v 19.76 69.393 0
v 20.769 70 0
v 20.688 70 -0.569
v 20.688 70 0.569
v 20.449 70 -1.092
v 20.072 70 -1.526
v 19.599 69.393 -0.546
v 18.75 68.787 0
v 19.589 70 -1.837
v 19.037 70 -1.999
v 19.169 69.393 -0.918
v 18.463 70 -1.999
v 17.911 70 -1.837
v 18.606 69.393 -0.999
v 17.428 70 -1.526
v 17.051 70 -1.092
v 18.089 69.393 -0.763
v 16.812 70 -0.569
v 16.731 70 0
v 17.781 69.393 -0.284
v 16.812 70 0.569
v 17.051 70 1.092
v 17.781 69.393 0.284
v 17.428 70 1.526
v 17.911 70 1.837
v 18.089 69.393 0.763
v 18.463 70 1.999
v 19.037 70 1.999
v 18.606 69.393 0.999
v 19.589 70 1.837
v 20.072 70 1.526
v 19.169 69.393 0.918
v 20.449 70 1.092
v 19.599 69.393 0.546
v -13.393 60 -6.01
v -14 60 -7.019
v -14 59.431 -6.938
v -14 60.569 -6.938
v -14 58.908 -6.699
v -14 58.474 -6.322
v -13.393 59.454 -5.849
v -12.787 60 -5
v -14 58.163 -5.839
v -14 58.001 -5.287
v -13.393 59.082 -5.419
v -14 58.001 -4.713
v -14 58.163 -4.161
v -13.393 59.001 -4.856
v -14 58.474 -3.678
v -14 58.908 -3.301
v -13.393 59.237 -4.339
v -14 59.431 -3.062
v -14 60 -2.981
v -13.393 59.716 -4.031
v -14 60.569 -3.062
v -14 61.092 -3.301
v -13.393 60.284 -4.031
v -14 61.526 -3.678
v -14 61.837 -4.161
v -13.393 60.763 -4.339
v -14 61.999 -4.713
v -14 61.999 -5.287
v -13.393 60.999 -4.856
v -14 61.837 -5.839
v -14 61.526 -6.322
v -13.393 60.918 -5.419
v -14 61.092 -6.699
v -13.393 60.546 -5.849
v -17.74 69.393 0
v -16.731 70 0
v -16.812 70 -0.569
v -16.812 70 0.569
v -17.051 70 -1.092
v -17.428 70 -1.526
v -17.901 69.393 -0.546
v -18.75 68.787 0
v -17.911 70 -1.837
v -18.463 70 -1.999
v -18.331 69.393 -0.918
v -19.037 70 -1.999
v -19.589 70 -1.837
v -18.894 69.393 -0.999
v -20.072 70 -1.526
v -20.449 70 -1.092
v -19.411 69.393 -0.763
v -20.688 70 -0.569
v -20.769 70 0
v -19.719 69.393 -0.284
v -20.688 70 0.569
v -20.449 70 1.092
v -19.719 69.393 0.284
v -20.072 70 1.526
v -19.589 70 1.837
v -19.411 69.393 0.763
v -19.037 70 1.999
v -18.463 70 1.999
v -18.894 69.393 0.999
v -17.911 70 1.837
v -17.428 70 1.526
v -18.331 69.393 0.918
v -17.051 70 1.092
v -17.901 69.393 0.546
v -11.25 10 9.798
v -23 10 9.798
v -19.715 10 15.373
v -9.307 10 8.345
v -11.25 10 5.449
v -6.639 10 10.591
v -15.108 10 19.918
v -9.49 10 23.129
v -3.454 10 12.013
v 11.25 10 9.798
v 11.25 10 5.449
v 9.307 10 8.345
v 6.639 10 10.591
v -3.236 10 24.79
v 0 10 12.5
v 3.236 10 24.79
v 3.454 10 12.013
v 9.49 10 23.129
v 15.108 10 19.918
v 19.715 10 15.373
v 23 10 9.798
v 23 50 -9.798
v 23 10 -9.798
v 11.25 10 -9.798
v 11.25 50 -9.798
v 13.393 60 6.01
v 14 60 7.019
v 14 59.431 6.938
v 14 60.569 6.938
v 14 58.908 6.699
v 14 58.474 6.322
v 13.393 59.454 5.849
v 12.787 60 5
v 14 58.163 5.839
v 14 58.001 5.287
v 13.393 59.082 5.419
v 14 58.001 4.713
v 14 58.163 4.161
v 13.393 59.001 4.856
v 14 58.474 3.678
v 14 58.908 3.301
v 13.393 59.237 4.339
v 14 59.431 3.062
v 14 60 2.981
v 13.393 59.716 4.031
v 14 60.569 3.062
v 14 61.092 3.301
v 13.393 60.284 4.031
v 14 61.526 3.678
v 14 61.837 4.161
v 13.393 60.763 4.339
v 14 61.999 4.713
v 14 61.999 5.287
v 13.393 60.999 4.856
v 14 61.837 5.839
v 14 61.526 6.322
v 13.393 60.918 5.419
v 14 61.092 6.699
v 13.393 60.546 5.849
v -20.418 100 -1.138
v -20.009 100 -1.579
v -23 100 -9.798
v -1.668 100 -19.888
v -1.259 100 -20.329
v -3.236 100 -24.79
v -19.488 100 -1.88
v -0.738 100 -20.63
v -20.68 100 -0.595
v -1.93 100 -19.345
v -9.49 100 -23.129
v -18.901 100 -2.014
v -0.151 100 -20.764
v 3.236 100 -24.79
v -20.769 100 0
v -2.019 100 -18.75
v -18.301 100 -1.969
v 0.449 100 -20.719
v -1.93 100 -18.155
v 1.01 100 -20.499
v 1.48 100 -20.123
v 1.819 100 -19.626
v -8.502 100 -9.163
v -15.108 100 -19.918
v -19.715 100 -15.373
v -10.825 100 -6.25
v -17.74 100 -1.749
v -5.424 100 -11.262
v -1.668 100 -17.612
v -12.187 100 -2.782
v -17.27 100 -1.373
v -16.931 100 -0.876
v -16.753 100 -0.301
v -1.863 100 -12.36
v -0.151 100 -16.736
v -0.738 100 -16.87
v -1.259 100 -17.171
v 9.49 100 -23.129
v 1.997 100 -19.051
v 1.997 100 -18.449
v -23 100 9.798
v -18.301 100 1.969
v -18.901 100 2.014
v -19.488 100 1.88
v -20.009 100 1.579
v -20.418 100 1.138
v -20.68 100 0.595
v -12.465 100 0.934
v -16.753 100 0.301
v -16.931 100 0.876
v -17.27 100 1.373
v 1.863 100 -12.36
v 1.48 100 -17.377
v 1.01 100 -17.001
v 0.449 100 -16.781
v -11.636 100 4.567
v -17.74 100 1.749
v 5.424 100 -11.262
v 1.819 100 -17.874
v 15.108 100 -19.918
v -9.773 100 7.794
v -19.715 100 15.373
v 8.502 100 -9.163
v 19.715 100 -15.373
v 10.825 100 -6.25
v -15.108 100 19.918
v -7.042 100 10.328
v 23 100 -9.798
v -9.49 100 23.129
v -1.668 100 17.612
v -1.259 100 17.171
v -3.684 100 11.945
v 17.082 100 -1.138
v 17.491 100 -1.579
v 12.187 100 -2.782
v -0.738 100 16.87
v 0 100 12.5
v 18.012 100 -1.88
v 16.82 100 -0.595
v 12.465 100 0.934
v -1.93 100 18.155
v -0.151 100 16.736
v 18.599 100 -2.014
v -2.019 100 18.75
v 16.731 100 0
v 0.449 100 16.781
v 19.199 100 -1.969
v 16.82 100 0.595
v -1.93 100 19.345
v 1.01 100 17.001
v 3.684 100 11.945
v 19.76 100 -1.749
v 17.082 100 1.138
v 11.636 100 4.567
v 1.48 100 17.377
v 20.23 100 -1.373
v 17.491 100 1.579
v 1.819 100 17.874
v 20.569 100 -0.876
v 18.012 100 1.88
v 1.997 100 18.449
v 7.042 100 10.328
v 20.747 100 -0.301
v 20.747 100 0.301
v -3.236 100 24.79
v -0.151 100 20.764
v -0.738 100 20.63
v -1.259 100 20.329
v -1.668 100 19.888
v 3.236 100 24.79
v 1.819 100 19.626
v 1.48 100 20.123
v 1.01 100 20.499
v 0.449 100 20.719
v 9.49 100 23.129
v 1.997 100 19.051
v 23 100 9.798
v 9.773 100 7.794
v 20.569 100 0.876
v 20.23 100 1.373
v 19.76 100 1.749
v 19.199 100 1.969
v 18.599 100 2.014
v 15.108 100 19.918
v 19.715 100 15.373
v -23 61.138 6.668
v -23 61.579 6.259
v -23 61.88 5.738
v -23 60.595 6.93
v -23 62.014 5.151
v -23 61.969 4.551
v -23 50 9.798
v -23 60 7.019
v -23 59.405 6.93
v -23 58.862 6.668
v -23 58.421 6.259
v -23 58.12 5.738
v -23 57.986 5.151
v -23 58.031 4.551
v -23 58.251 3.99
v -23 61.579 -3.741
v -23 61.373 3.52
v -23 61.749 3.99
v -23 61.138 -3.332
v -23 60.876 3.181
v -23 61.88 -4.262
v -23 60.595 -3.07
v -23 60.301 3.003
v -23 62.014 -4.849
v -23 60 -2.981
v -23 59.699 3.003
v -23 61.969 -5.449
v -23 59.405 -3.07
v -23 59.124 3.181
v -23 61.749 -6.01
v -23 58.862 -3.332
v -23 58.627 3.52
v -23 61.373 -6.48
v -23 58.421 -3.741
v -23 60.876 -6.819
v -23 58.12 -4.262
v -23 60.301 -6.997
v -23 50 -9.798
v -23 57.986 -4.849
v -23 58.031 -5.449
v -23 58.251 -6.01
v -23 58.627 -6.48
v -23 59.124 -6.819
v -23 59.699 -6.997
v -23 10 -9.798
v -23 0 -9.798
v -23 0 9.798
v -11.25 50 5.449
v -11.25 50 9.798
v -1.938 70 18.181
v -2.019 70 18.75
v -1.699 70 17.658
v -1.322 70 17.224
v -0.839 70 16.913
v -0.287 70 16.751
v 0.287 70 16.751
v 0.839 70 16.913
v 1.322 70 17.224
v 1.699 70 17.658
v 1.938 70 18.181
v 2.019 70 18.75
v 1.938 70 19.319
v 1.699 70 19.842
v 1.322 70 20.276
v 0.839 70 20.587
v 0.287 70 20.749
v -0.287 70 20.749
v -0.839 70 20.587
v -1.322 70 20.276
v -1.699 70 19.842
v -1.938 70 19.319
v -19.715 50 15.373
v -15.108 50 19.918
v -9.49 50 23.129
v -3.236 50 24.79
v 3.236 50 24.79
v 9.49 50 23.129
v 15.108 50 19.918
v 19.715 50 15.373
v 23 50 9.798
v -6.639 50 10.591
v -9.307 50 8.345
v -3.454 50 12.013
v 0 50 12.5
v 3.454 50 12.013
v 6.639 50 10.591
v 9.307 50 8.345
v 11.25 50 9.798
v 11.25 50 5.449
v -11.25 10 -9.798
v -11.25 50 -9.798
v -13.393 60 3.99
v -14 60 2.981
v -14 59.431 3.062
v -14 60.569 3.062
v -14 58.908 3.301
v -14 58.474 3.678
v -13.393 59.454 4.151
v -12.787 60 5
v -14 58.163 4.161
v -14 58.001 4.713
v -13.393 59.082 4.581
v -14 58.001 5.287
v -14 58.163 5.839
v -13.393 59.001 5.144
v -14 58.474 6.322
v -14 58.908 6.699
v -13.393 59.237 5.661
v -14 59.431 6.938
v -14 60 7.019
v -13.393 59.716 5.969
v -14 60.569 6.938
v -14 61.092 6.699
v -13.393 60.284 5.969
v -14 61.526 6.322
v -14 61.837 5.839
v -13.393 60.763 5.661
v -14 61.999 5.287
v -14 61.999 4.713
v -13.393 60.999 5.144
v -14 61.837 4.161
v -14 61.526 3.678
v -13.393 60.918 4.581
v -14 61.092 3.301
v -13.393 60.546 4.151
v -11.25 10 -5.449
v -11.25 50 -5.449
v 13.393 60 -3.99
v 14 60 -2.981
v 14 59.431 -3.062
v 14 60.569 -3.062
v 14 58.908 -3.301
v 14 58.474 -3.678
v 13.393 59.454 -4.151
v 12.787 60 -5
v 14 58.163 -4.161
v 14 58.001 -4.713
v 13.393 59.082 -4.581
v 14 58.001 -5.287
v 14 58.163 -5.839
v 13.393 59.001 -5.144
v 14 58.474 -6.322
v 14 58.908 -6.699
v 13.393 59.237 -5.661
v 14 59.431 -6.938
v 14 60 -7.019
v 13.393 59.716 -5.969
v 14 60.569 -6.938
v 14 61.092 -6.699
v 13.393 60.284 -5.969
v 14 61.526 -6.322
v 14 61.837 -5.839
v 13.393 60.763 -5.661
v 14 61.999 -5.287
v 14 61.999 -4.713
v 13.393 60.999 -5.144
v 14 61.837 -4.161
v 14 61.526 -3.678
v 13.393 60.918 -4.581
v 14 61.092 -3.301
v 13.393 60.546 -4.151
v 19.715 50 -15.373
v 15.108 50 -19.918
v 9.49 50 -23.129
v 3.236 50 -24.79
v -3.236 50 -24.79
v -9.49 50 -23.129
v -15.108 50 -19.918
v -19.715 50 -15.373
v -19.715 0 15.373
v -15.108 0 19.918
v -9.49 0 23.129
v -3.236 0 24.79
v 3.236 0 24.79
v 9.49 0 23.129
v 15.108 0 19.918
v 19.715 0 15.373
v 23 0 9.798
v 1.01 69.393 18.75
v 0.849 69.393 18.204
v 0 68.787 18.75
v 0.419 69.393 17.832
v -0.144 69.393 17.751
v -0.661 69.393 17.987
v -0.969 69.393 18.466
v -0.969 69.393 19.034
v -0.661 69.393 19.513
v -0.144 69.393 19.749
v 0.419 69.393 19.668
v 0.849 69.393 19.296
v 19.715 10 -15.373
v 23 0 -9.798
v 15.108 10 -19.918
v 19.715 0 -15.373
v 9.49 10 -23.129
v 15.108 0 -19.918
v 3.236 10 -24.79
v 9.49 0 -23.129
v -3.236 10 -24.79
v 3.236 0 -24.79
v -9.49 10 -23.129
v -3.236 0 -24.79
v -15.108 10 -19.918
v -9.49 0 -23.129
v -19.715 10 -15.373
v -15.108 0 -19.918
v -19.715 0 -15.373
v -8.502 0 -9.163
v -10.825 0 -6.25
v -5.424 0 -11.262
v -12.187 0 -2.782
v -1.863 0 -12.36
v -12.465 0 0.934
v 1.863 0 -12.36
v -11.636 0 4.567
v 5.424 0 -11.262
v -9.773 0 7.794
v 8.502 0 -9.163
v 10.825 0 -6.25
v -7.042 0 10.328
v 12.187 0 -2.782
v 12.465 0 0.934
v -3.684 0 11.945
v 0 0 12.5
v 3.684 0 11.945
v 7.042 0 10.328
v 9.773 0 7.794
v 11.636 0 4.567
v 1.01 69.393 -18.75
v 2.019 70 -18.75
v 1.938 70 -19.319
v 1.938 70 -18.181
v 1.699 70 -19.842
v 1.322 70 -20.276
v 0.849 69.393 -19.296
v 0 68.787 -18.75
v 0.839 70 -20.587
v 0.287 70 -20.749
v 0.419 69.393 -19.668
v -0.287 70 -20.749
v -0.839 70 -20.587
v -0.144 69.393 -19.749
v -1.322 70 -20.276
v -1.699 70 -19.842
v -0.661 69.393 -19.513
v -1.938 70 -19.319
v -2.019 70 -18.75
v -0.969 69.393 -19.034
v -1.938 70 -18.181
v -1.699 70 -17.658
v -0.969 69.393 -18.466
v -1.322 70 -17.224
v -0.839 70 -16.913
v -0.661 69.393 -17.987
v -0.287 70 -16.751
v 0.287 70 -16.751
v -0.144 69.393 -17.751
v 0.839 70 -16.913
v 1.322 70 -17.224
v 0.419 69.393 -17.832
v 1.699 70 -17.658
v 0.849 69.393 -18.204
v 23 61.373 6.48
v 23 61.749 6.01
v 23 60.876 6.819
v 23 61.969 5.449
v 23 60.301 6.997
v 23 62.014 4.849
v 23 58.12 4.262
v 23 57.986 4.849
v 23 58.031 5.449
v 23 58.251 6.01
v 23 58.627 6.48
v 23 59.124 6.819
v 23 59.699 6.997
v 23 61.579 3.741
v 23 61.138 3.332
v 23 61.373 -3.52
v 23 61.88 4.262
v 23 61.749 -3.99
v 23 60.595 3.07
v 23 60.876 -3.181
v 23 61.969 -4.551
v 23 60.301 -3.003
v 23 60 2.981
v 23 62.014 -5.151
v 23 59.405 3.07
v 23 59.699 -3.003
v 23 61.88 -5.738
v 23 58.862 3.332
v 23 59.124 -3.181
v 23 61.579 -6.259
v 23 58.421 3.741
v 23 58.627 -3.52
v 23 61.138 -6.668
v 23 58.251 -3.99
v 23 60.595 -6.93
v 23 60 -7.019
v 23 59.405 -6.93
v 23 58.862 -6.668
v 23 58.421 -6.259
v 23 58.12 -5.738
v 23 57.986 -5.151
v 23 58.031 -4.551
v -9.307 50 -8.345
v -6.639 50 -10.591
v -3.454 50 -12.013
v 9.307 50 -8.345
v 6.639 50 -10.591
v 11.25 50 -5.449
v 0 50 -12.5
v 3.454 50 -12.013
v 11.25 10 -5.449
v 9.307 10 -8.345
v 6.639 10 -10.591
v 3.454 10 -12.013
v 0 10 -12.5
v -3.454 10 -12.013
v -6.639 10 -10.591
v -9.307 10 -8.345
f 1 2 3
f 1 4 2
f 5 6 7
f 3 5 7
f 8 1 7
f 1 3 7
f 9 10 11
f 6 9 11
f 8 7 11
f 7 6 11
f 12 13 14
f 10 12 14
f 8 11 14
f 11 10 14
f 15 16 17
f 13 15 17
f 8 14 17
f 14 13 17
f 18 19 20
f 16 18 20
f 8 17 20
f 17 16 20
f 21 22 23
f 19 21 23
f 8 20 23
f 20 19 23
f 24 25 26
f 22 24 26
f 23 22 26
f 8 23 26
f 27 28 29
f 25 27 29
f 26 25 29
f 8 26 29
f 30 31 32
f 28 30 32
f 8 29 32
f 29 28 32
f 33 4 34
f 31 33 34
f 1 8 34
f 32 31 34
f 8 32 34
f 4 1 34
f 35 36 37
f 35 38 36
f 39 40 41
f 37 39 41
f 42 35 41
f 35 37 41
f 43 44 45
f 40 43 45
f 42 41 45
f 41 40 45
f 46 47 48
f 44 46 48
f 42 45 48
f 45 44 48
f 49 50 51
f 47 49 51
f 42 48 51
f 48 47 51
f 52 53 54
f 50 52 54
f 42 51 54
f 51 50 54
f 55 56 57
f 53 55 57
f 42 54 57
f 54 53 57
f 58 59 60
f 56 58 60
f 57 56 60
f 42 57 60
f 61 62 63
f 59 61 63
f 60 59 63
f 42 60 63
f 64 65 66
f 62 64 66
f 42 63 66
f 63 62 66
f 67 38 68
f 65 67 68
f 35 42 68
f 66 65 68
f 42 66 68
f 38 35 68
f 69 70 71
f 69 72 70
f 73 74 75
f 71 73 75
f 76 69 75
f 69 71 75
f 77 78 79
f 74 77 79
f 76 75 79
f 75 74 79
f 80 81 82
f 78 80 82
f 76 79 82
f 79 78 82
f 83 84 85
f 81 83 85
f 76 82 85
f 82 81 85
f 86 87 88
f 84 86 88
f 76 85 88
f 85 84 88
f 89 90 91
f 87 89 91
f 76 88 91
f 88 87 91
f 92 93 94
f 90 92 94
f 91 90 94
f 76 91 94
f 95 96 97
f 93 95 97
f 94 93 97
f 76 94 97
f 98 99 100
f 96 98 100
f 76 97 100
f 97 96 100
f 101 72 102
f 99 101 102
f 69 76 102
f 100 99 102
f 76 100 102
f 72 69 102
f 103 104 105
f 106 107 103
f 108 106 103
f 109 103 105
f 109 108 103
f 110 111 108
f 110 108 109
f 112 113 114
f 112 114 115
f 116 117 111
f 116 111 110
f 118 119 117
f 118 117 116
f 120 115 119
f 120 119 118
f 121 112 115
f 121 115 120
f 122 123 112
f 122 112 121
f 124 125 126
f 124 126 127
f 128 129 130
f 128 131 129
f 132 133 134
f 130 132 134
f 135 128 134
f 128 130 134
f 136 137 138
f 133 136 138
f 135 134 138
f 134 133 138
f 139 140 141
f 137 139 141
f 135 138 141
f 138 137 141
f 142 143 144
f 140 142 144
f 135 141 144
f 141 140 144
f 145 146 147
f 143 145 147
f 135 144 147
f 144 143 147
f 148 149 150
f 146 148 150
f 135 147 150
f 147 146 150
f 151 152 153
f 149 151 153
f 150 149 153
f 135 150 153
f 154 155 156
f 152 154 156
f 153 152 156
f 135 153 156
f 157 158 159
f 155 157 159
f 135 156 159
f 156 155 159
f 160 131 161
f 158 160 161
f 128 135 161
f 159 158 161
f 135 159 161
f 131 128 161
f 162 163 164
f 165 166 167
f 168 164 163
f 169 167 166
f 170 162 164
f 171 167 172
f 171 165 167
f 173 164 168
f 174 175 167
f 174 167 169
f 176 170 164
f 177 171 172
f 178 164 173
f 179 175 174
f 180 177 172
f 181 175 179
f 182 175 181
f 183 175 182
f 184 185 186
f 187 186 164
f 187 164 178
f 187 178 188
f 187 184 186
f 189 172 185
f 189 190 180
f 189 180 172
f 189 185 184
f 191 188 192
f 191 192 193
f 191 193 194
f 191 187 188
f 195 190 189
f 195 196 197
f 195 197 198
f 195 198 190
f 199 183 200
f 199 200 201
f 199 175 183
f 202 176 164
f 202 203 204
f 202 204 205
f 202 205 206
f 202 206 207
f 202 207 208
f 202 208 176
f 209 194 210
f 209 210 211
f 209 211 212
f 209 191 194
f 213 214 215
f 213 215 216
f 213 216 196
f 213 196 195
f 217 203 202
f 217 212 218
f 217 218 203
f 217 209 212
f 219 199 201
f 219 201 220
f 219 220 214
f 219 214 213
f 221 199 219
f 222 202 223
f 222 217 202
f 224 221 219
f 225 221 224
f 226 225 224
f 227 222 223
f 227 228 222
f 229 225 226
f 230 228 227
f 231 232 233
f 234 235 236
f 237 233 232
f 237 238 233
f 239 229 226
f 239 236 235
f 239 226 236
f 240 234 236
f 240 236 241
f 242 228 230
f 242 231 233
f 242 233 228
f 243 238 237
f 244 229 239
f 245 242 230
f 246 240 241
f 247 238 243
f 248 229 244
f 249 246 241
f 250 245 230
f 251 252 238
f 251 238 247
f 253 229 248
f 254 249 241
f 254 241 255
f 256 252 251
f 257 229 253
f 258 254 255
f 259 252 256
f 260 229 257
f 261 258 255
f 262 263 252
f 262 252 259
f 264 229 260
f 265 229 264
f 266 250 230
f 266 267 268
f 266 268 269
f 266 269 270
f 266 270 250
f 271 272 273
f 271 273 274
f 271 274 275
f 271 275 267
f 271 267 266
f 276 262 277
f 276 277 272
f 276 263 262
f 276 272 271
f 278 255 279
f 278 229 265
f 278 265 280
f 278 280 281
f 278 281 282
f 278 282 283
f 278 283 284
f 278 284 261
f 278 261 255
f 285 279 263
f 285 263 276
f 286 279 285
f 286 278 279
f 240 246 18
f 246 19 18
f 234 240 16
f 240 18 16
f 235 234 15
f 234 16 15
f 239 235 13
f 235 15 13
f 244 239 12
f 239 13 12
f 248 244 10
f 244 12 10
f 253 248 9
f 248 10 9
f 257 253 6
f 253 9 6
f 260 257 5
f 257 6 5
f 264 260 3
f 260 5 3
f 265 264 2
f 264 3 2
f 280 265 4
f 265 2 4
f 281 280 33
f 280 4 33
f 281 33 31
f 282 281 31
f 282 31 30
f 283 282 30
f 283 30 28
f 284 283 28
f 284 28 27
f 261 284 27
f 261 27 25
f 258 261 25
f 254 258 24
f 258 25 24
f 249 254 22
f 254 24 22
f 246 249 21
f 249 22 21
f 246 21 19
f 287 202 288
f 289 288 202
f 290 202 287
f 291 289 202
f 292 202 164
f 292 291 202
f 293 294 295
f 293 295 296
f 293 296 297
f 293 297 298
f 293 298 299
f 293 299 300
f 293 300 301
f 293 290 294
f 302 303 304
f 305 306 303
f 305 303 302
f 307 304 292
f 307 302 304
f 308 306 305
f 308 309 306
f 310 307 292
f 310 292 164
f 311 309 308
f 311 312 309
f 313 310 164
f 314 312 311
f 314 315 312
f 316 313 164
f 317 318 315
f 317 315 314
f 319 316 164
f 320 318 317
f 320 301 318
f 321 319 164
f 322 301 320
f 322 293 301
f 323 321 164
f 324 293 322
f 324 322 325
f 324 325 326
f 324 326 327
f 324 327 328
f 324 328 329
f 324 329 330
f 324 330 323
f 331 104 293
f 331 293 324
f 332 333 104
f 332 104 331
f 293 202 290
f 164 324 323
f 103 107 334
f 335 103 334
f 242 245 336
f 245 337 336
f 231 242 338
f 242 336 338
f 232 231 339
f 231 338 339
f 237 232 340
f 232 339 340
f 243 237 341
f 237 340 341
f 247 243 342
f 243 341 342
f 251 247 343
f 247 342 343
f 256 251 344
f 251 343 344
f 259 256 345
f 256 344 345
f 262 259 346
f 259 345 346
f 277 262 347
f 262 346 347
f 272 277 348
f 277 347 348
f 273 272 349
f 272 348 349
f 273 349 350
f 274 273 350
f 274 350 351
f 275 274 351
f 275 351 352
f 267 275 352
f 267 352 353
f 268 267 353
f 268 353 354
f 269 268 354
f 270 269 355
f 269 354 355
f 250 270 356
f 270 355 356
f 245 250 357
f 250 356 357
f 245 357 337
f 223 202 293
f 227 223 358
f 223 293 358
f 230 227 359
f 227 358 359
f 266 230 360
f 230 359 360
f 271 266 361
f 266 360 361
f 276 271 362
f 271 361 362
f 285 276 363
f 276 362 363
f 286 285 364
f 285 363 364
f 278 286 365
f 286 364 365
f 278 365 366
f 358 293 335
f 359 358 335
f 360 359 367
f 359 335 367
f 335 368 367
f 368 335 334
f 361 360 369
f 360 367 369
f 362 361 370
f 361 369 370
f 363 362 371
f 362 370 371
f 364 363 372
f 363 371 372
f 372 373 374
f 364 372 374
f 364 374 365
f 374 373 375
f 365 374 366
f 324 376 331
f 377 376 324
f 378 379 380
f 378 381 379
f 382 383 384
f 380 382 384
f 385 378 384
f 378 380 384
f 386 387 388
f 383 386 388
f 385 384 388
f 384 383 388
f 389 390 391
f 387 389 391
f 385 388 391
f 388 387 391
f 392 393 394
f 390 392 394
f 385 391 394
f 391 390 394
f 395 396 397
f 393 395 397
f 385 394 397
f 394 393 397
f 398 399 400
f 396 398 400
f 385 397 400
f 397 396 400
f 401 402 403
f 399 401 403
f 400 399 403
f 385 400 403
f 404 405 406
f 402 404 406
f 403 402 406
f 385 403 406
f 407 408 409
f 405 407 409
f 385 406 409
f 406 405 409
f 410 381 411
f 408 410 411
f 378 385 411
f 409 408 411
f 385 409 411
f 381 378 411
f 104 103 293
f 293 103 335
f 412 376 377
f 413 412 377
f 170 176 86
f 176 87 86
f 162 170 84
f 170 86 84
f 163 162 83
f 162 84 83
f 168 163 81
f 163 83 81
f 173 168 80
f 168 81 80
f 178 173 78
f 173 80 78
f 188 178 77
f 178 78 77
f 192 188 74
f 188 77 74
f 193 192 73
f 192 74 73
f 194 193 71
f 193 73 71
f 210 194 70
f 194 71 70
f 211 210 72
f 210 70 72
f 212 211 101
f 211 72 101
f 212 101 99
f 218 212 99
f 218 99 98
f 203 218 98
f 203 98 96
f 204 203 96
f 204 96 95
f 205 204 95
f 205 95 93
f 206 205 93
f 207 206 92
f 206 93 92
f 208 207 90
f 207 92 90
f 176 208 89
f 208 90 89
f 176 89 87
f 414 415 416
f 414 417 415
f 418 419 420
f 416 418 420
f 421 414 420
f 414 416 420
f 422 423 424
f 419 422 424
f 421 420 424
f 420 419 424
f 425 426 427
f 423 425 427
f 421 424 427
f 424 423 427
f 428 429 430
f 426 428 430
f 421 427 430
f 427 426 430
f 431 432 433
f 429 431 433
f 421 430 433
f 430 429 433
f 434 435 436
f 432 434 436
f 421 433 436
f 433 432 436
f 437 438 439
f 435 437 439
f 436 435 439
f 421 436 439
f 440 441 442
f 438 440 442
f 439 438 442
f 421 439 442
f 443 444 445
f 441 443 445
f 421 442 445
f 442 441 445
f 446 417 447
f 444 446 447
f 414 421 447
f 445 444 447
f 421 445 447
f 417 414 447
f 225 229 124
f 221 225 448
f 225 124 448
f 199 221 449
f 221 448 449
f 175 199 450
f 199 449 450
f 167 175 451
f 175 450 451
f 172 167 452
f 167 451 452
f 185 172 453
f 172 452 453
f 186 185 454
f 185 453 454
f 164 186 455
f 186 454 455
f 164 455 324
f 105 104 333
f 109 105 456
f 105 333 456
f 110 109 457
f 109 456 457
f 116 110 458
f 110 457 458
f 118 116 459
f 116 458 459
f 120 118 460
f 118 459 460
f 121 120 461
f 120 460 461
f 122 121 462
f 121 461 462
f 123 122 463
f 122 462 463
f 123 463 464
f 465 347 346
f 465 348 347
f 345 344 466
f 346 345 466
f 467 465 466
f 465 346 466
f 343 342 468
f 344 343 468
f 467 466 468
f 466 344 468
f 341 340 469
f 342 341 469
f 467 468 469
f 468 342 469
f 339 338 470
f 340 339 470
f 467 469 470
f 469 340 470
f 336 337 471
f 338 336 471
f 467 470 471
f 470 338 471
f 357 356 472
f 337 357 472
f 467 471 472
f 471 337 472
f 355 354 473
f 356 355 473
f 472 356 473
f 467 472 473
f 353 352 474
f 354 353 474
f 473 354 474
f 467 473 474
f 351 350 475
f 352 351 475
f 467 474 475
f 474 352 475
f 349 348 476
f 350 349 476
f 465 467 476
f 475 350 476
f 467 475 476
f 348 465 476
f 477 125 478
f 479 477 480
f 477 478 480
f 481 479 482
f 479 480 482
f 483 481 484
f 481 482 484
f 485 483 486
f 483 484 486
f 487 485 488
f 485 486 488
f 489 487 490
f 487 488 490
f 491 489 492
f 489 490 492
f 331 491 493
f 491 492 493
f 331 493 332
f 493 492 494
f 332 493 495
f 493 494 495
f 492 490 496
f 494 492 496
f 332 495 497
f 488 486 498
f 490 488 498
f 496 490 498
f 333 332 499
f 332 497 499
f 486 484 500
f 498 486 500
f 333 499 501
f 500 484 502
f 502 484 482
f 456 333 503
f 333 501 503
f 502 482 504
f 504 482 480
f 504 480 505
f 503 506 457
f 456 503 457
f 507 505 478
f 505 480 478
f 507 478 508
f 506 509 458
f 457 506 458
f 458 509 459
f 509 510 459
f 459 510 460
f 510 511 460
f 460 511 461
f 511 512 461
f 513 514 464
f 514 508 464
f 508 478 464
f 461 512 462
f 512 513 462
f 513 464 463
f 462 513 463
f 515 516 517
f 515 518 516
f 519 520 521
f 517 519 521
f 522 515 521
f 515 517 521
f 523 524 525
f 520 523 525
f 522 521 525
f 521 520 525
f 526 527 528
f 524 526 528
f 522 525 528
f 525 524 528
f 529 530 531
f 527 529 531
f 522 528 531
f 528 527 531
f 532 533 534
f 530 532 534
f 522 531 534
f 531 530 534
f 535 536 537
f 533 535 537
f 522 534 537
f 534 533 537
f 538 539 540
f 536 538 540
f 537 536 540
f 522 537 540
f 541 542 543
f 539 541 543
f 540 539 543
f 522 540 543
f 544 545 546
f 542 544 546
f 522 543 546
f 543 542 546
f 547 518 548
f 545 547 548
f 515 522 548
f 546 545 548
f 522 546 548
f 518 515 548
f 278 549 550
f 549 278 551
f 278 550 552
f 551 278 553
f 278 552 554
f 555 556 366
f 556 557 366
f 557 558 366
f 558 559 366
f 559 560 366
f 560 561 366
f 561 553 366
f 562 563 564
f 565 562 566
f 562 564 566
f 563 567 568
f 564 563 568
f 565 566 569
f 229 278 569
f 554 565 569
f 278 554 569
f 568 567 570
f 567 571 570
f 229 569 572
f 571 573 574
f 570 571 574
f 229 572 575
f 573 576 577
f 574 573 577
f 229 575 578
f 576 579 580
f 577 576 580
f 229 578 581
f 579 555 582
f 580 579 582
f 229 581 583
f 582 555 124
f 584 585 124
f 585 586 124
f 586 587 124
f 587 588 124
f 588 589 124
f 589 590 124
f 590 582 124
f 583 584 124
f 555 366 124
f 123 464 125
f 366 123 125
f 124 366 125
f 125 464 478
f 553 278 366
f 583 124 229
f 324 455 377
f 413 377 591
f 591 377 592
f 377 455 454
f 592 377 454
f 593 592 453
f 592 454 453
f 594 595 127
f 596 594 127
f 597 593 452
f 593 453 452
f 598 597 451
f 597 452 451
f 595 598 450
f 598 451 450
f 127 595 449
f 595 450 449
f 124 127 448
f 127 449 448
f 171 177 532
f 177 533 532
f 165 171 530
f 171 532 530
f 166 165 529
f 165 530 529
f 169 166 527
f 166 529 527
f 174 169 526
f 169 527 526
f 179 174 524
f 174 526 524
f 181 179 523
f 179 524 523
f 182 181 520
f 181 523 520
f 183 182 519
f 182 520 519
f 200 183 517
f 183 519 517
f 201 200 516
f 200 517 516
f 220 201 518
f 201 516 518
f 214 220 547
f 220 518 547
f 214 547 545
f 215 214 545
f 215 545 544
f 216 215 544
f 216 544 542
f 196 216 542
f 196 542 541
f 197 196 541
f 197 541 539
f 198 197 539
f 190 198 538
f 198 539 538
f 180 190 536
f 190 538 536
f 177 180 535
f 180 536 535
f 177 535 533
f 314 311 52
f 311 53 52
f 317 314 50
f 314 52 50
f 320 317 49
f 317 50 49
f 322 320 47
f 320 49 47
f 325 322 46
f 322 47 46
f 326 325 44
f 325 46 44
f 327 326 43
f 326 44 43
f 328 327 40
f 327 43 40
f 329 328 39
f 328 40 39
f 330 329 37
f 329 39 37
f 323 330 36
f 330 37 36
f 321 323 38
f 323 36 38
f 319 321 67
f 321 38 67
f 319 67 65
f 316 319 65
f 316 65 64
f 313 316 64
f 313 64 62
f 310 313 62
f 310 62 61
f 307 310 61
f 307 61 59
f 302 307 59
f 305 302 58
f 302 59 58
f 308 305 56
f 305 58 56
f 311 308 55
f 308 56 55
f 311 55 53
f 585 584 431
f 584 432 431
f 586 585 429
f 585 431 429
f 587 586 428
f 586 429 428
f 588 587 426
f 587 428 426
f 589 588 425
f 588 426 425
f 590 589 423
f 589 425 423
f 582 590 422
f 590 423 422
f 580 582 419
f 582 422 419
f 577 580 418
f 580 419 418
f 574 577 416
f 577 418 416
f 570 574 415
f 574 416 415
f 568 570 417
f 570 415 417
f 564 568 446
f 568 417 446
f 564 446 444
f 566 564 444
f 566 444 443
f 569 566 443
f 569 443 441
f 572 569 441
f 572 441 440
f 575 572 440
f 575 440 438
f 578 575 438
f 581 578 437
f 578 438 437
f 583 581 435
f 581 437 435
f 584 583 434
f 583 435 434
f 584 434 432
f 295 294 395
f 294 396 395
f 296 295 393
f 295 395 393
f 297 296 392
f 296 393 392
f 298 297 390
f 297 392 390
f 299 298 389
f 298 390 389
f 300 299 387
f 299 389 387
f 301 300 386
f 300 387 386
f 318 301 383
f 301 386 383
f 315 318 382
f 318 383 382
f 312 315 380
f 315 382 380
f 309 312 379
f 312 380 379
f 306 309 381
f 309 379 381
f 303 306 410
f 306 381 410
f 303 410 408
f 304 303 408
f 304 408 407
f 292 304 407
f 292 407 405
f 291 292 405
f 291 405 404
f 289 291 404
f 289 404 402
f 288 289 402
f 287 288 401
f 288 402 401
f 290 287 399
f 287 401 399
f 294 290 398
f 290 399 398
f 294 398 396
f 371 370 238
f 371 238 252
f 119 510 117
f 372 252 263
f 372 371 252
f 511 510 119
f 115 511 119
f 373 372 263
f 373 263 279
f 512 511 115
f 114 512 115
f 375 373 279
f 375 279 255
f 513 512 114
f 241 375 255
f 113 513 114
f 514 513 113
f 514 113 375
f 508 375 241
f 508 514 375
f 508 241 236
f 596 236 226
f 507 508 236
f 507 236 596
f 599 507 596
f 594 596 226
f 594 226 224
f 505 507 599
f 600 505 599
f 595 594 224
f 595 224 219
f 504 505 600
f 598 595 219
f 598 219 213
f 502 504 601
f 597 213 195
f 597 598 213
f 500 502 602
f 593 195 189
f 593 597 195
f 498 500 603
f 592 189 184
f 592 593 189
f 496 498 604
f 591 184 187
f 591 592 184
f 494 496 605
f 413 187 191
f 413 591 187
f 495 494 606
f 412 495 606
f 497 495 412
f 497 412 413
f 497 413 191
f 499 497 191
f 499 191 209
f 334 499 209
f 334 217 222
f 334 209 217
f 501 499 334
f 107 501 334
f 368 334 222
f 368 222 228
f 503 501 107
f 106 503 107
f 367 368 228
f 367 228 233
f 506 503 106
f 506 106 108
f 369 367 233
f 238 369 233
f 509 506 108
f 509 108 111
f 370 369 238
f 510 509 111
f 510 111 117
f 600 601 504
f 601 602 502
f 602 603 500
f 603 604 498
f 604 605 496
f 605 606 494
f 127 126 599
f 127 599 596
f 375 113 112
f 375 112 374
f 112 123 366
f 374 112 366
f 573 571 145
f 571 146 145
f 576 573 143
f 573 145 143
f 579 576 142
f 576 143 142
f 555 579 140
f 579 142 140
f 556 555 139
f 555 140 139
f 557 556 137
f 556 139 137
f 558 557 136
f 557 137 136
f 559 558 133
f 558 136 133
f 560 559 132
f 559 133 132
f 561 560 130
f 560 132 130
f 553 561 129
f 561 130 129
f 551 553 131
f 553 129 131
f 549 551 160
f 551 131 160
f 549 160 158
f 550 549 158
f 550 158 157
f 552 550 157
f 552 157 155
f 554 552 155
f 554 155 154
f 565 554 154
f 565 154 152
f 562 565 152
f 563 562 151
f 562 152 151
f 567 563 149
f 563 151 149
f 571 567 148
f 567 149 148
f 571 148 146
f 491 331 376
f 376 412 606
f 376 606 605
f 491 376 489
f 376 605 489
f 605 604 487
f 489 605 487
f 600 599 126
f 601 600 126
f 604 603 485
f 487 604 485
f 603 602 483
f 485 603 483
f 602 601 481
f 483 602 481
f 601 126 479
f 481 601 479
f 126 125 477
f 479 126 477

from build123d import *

# Parameters (mm, degrees)
SKETCH1_R                            = 25
BOSS_EXTRUDE1_DEPTH                  = 100
SKETCH7_R                            = 12.5
THRU_HOLE_DEPTH                      = 107.066017178
SKETCH5_W                            = 5
SKETCH5_H                            = 25
MOUNT_FLATS_DEPTH                    = 107.066017178
F_10_32_TAPPED_HOLE3_D               = 4.0386
F_10_32_TAPPED_HOLE3_DEPTH           = 30
F_10_32_TAPPED_HOLE3_TIP             = 1.213317848
SKETCH6_W                            = 20
SKETCH6_H                            = 40
WINDOW_SLOT_1_DEPTH                  = 106.61249926
WINDOW_SLOT_2_DEPTH                  = 106.61249926
WINDOW_SLOT_2_DEPTH_BACK             = 106.61249926
SKETCH18_W                           = 22.5
SKETCH18_H                           = 40
F_10_32_TAPPED_HOLE2_D               = 4.0386
F_10_32_TAPPED_HOLE2_DEPTH           = 9
F_10_32_TAPPED_HOLE2_TIP             = 1.213317848
F_10_32_TAPPED_HOLE2_ON_FACE_2_D     = 4.0386
F_10_32_TAPPED_HOLE2_ON_FACE_2_DEPTH = 9
F_10_32_TAPPED_HOLE2_ON_FACE_2_TIP   = 1.213317848
SKETCH22_R                           = 2.5273
SKETCH22_R_2                         = 12.5
BOSS_EXTRUDE2_DEPTH                  = 6.35
SAVE_START                           = 100
SAVE_BODIES2_OUTLINE_R               = 2.5273
SAVE_BODIES2_OUTLINE_R_2             = 12.5
SAVE_BODIES2_DEPTH                   = 6.35


# Read off the part's stored shape, not the designer's step: Save Bodies2
with BuildPart() as part:
    # Sketch1 → Boss-Extrude1 (new body)
    with BuildSketch(Plane(origin=(0, 0, 0), x_dir=(1, 0, 0), z_dir=(0, 1, 0))):
        with Locations(Location((0, 0, 0), (0, 0, 270))):
            Circle(SKETCH1_R)
    extrude(amount=BOSS_EXTRUDE1_DEPTH)

    # Sketch7 → Thru Hole (cut, through all)
    with BuildSketch(Plane(origin=(0, 0, 0), x_dir=(1, 0, 0), z_dir=(0, 1, 0))):
        with Locations(Location((0, 0, 0), (0, 0, 270))):
            Circle(SKETCH7_R)
    extrude(amount=THRU_HOLE_DEPTH, mode=Mode.SUBTRACT)

    # Sketch5 → Mount Flats (cut, through all)
    with BuildSketch(Plane(origin=(0, 0, 0), x_dir=(1, 0, 0), z_dir=(0, 1, 0))):
        with Locations((-25.5, 0)):
            Rectangle(SKETCH5_W, SKETCH5_H)
        with Locations((25.5, 0)):
            Rectangle(SKETCH5_W, SKETCH5_H)
    extrude(amount=MOUNT_FLATS_DEPTH, mode=Mode.SUBTRACT)

    # #10-32 Tapped Hole3
    with Locations(Plane(origin=(0, 100, 0), x_dir=(1, 0, 0), z_dir=(0, 1, 0))):
        with Locations((0, 18.75), (-18.75, 0), (0, -18.75), (18.75, 0)):
            Hole(F_10_32_TAPPED_HOLE3_D / 2, depth=F_10_32_TAPPED_HOLE3_DEPTH)
            with Locations((0, 0, -(F_10_32_TAPPED_HOLE3_DEPTH + F_10_32_TAPPED_HOLE3_TIP / 2))):  # 118° drill point
                Cone(0, F_10_32_TAPPED_HOLE3_D / 2, F_10_32_TAPPED_HOLE3_TIP, mode=Mode.SUBTRACT)

    # Sketch6 → Window Slot 1 (cut, symmetric)
    with BuildSketch(Plane(origin=(0, 0, 0), x_dir=(0, 0, -1), z_dir=(1, 0, 0))):
        with Locations((19.797958971, 30)):
            Rectangle(SKETCH6_W, SKETCH6_H)
    window_slot_1 = extrude(amount=WINDOW_SLOT_1_DEPTH, both=True, mode=Mode.SUBTRACT)

    # Mirror2: Window Slot 1 across plane
    add(window_slot_1.mirror(Plane.XY), mode=Mode.SUBTRACT)

    # Sketch18 → Window Slot 2 (cut, two sides: drawn at the far end of the back side and taken through both)
    with BuildSketch(Plane.XY.offset(-WINDOW_SLOT_2_DEPTH_BACK)):
        with Locations((0, 30)):
            Rectangle(SKETCH18_W, SKETCH18_H)
    extrude(amount=WINDOW_SLOT_2_DEPTH + WINDOW_SLOT_2_DEPTH_BACK, mode=Mode.SUBTRACT)

    # #10-32 Tapped Hole2
    with Locations(Plane(origin=(-23, 60, 5), x_dir=(0, 0, -1), z_dir=(-1, 0, 0))):
        with Locations((0, 0), (10, 0)):
            Hole(F_10_32_TAPPED_HOLE2_D / 2, depth=F_10_32_TAPPED_HOLE2_DEPTH)
            with Locations((0, 0, -(F_10_32_TAPPED_HOLE2_DEPTH + F_10_32_TAPPED_HOLE2_TIP / 2))):  # 118° drill point
                Cone(0, F_10_32_TAPPED_HOLE2_D / 2, F_10_32_TAPPED_HOLE2_TIP, mode=Mode.SUBTRACT)

    # #10-32 Tapped Hole2 on face 2
    with Locations(Plane(origin=(23, 60, 5), x_dir=(0, 0, 1), z_dir=(1, 0, 0))):
        with Locations((0, 0), (-10, 0)):
            Hole(F_10_32_TAPPED_HOLE2_ON_FACE_2_D / 2, depth=F_10_32_TAPPED_HOLE2_ON_FACE_2_DEPTH)
            with Locations((0, 0, -(F_10_32_TAPPED_HOLE2_ON_FACE_2_DEPTH + F_10_32_TAPPED_HOLE2_ON_FACE_2_TIP / 2))):  # 118° drill point
                Cone(0, F_10_32_TAPPED_HOLE2_ON_FACE_2_D / 2, F_10_32_TAPPED_HOLE2_ON_FACE_2_TIP, mode=Mode.SUBTRACT)


with BuildPart() as body_2:
    # Sketch22 → Boss-Extrude2 (new body)
    with BuildSketch(Plane(origin=(0, 100, 0), x_dir=(1, 0, 0), z_dir=(0, 1, 0))):
        with BuildLine():
            Line((23, -9.797958971), (23, 9.797958971))
            ThreePointArc((23, 9.797958971), (0, 25), (-23, 9.797958971))
            Line((-23, 9.797958971), (-23, -9.797958971))
            ThreePointArc((-23, -9.797958971), (0, -25), (23, -9.797958971))
        make_face()
        with Locations(Location((-18.75, 0, 0), (0, 0, 270))):
            Circle(SKETCH22_R, mode=Mode.SUBTRACT)
        with Locations(Location((0, 18.75, 0), (0, 0, 270))):
            Circle(SKETCH22_R, mode=Mode.SUBTRACT)
        with Locations(Location((18.75, 0, 0), (0, 0, 270))):
            Circle(SKETCH22_R, mode=Mode.SUBTRACT)
        with Locations(Location((0, -18.75, 0), (0, 0, 270))):
            Circle(SKETCH22_R, mode=Mode.SUBTRACT)
        with Locations(Location((0, 0, 0), (0, 0, 270))):
            Circle(SKETCH22_R_2, mode=Mode.SUBTRACT)
    extrude(amount=BOSS_EXTRUDE2_DEPTH)

    # Save Bodies2 outline → Save Bodies2 (cut)
    with BuildSketch(Plane(origin=(0, 0, 0), x_dir=(1, 0, 0), z_dir=(0, 1, 0)).offset(SAVE_START)):
        with BuildLine():
            ThreePointArc((-23, -9.797958971), (0, -25), (23, -9.797958971))
            Line((23, -9.797958971), (23, 9.797958971))
            ThreePointArc((23, 9.797958971), (0, 25), (-23, 9.797958971))
            Line((-23, 9.797958971), (-23, -9.797958971))
        make_face()
        with Locations((0, -18.75)):
            Circle(SAVE_BODIES2_OUTLINE_R, mode=Mode.SUBTRACT)
        with Locations((-18.75, 0)):
            Circle(SAVE_BODIES2_OUTLINE_R, mode=Mode.SUBTRACT)
        Circle(SAVE_BODIES2_OUTLINE_R_2, mode=Mode.SUBTRACT)
        with Locations((18.75, 0)):
            Circle(SAVE_BODIES2_OUTLINE_R, mode=Mode.SUBTRACT)
        with Locations((0, 18.75)):
            Circle(SAVE_BODIES2_OUTLINE_R, mode=Mode.SUBTRACT)
    extrude(amount=SAVE_BODIES2_DEPTH, mode=Mode.SUBTRACT)


solid = part.part
